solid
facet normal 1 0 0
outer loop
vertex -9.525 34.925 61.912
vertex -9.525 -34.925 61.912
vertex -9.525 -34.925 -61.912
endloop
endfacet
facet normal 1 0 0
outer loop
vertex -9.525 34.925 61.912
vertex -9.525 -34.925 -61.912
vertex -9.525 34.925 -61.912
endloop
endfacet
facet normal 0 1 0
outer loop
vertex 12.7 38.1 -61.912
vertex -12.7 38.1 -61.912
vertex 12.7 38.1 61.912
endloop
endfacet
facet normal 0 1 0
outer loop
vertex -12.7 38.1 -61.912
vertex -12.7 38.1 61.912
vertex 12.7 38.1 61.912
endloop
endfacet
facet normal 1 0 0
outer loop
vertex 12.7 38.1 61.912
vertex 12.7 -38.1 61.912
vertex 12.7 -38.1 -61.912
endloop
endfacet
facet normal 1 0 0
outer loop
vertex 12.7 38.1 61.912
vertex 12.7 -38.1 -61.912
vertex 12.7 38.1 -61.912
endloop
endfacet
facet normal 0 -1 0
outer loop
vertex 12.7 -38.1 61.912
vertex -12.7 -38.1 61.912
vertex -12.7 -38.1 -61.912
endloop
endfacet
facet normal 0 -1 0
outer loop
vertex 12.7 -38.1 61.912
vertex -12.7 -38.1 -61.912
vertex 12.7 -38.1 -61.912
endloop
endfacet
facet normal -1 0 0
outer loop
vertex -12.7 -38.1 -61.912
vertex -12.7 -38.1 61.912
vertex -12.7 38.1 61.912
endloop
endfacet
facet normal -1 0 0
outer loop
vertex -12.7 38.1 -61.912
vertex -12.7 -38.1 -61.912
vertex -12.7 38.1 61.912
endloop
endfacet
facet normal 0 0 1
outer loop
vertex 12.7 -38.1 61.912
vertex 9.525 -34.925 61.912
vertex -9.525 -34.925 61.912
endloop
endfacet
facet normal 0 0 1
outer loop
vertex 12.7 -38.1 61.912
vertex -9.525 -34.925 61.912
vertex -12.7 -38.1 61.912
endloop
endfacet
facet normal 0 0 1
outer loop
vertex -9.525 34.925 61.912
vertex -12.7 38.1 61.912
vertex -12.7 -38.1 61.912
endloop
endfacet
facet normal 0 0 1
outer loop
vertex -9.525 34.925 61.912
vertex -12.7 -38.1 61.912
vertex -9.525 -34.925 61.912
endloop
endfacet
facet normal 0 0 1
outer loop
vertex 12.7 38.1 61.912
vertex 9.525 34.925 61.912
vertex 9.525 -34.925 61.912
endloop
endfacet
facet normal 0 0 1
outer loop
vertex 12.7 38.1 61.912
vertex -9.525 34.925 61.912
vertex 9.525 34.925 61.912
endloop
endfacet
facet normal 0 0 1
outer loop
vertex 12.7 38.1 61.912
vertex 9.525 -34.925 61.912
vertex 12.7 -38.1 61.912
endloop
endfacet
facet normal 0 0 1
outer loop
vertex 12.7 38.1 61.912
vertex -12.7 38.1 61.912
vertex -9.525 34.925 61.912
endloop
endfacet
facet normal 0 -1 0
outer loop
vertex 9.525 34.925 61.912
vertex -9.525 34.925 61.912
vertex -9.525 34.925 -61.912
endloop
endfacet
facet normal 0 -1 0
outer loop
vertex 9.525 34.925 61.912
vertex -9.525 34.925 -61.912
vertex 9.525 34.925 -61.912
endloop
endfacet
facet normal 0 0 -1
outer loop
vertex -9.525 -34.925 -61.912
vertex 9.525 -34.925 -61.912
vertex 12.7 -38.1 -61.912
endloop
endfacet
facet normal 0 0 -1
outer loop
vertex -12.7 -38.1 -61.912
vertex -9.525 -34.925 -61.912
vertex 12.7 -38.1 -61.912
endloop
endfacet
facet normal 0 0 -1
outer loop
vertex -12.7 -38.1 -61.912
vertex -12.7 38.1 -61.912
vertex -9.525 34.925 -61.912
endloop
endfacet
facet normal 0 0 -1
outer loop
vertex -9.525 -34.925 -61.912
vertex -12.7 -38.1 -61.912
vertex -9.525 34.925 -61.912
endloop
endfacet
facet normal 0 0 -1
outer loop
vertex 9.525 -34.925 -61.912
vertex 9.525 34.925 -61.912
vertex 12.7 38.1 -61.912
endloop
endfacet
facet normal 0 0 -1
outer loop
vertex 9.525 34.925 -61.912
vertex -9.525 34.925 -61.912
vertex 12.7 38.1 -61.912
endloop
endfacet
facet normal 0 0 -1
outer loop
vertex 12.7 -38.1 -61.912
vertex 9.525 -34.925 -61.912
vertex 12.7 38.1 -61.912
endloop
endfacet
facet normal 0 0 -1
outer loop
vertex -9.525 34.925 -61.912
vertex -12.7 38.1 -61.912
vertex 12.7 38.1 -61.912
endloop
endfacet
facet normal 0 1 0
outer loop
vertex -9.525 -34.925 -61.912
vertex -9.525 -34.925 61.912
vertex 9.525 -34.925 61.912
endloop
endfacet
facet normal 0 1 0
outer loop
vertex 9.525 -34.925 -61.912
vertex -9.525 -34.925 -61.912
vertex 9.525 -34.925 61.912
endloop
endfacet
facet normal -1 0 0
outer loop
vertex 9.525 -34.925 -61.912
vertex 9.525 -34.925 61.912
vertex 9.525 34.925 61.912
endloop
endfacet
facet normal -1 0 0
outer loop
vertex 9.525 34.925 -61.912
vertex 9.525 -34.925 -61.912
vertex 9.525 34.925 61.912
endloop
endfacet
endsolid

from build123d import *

# Parameters (mm, degrees)
SKETCH1_W           = 25.4
SKETCH1_H           = 76.2
BOSS_EXTRUDE1_DEPTH = 61.9125
SHELL1_T            = -3.175


with BuildPart() as part:
    # Sketch1 → Boss-Extrude1 (new body, symmetric)
    with BuildSketch(Plane.XY):
        Rectangle(SKETCH1_W, SKETCH1_H)
    extrude(amount=BOSS_EXTRUDE1_DEPTH, both=True)

    # Shell1
    shell1_openings = [part.faces().sort_by_distance(p)[0] for p in [
        (0, 0, 61.9125),
        (0, 0, -61.9125),
    ]]
    offset(amount=SHELL1_T, openings=shell1_openings, kind=Kind.INTERSECTION)


solid = part.part
